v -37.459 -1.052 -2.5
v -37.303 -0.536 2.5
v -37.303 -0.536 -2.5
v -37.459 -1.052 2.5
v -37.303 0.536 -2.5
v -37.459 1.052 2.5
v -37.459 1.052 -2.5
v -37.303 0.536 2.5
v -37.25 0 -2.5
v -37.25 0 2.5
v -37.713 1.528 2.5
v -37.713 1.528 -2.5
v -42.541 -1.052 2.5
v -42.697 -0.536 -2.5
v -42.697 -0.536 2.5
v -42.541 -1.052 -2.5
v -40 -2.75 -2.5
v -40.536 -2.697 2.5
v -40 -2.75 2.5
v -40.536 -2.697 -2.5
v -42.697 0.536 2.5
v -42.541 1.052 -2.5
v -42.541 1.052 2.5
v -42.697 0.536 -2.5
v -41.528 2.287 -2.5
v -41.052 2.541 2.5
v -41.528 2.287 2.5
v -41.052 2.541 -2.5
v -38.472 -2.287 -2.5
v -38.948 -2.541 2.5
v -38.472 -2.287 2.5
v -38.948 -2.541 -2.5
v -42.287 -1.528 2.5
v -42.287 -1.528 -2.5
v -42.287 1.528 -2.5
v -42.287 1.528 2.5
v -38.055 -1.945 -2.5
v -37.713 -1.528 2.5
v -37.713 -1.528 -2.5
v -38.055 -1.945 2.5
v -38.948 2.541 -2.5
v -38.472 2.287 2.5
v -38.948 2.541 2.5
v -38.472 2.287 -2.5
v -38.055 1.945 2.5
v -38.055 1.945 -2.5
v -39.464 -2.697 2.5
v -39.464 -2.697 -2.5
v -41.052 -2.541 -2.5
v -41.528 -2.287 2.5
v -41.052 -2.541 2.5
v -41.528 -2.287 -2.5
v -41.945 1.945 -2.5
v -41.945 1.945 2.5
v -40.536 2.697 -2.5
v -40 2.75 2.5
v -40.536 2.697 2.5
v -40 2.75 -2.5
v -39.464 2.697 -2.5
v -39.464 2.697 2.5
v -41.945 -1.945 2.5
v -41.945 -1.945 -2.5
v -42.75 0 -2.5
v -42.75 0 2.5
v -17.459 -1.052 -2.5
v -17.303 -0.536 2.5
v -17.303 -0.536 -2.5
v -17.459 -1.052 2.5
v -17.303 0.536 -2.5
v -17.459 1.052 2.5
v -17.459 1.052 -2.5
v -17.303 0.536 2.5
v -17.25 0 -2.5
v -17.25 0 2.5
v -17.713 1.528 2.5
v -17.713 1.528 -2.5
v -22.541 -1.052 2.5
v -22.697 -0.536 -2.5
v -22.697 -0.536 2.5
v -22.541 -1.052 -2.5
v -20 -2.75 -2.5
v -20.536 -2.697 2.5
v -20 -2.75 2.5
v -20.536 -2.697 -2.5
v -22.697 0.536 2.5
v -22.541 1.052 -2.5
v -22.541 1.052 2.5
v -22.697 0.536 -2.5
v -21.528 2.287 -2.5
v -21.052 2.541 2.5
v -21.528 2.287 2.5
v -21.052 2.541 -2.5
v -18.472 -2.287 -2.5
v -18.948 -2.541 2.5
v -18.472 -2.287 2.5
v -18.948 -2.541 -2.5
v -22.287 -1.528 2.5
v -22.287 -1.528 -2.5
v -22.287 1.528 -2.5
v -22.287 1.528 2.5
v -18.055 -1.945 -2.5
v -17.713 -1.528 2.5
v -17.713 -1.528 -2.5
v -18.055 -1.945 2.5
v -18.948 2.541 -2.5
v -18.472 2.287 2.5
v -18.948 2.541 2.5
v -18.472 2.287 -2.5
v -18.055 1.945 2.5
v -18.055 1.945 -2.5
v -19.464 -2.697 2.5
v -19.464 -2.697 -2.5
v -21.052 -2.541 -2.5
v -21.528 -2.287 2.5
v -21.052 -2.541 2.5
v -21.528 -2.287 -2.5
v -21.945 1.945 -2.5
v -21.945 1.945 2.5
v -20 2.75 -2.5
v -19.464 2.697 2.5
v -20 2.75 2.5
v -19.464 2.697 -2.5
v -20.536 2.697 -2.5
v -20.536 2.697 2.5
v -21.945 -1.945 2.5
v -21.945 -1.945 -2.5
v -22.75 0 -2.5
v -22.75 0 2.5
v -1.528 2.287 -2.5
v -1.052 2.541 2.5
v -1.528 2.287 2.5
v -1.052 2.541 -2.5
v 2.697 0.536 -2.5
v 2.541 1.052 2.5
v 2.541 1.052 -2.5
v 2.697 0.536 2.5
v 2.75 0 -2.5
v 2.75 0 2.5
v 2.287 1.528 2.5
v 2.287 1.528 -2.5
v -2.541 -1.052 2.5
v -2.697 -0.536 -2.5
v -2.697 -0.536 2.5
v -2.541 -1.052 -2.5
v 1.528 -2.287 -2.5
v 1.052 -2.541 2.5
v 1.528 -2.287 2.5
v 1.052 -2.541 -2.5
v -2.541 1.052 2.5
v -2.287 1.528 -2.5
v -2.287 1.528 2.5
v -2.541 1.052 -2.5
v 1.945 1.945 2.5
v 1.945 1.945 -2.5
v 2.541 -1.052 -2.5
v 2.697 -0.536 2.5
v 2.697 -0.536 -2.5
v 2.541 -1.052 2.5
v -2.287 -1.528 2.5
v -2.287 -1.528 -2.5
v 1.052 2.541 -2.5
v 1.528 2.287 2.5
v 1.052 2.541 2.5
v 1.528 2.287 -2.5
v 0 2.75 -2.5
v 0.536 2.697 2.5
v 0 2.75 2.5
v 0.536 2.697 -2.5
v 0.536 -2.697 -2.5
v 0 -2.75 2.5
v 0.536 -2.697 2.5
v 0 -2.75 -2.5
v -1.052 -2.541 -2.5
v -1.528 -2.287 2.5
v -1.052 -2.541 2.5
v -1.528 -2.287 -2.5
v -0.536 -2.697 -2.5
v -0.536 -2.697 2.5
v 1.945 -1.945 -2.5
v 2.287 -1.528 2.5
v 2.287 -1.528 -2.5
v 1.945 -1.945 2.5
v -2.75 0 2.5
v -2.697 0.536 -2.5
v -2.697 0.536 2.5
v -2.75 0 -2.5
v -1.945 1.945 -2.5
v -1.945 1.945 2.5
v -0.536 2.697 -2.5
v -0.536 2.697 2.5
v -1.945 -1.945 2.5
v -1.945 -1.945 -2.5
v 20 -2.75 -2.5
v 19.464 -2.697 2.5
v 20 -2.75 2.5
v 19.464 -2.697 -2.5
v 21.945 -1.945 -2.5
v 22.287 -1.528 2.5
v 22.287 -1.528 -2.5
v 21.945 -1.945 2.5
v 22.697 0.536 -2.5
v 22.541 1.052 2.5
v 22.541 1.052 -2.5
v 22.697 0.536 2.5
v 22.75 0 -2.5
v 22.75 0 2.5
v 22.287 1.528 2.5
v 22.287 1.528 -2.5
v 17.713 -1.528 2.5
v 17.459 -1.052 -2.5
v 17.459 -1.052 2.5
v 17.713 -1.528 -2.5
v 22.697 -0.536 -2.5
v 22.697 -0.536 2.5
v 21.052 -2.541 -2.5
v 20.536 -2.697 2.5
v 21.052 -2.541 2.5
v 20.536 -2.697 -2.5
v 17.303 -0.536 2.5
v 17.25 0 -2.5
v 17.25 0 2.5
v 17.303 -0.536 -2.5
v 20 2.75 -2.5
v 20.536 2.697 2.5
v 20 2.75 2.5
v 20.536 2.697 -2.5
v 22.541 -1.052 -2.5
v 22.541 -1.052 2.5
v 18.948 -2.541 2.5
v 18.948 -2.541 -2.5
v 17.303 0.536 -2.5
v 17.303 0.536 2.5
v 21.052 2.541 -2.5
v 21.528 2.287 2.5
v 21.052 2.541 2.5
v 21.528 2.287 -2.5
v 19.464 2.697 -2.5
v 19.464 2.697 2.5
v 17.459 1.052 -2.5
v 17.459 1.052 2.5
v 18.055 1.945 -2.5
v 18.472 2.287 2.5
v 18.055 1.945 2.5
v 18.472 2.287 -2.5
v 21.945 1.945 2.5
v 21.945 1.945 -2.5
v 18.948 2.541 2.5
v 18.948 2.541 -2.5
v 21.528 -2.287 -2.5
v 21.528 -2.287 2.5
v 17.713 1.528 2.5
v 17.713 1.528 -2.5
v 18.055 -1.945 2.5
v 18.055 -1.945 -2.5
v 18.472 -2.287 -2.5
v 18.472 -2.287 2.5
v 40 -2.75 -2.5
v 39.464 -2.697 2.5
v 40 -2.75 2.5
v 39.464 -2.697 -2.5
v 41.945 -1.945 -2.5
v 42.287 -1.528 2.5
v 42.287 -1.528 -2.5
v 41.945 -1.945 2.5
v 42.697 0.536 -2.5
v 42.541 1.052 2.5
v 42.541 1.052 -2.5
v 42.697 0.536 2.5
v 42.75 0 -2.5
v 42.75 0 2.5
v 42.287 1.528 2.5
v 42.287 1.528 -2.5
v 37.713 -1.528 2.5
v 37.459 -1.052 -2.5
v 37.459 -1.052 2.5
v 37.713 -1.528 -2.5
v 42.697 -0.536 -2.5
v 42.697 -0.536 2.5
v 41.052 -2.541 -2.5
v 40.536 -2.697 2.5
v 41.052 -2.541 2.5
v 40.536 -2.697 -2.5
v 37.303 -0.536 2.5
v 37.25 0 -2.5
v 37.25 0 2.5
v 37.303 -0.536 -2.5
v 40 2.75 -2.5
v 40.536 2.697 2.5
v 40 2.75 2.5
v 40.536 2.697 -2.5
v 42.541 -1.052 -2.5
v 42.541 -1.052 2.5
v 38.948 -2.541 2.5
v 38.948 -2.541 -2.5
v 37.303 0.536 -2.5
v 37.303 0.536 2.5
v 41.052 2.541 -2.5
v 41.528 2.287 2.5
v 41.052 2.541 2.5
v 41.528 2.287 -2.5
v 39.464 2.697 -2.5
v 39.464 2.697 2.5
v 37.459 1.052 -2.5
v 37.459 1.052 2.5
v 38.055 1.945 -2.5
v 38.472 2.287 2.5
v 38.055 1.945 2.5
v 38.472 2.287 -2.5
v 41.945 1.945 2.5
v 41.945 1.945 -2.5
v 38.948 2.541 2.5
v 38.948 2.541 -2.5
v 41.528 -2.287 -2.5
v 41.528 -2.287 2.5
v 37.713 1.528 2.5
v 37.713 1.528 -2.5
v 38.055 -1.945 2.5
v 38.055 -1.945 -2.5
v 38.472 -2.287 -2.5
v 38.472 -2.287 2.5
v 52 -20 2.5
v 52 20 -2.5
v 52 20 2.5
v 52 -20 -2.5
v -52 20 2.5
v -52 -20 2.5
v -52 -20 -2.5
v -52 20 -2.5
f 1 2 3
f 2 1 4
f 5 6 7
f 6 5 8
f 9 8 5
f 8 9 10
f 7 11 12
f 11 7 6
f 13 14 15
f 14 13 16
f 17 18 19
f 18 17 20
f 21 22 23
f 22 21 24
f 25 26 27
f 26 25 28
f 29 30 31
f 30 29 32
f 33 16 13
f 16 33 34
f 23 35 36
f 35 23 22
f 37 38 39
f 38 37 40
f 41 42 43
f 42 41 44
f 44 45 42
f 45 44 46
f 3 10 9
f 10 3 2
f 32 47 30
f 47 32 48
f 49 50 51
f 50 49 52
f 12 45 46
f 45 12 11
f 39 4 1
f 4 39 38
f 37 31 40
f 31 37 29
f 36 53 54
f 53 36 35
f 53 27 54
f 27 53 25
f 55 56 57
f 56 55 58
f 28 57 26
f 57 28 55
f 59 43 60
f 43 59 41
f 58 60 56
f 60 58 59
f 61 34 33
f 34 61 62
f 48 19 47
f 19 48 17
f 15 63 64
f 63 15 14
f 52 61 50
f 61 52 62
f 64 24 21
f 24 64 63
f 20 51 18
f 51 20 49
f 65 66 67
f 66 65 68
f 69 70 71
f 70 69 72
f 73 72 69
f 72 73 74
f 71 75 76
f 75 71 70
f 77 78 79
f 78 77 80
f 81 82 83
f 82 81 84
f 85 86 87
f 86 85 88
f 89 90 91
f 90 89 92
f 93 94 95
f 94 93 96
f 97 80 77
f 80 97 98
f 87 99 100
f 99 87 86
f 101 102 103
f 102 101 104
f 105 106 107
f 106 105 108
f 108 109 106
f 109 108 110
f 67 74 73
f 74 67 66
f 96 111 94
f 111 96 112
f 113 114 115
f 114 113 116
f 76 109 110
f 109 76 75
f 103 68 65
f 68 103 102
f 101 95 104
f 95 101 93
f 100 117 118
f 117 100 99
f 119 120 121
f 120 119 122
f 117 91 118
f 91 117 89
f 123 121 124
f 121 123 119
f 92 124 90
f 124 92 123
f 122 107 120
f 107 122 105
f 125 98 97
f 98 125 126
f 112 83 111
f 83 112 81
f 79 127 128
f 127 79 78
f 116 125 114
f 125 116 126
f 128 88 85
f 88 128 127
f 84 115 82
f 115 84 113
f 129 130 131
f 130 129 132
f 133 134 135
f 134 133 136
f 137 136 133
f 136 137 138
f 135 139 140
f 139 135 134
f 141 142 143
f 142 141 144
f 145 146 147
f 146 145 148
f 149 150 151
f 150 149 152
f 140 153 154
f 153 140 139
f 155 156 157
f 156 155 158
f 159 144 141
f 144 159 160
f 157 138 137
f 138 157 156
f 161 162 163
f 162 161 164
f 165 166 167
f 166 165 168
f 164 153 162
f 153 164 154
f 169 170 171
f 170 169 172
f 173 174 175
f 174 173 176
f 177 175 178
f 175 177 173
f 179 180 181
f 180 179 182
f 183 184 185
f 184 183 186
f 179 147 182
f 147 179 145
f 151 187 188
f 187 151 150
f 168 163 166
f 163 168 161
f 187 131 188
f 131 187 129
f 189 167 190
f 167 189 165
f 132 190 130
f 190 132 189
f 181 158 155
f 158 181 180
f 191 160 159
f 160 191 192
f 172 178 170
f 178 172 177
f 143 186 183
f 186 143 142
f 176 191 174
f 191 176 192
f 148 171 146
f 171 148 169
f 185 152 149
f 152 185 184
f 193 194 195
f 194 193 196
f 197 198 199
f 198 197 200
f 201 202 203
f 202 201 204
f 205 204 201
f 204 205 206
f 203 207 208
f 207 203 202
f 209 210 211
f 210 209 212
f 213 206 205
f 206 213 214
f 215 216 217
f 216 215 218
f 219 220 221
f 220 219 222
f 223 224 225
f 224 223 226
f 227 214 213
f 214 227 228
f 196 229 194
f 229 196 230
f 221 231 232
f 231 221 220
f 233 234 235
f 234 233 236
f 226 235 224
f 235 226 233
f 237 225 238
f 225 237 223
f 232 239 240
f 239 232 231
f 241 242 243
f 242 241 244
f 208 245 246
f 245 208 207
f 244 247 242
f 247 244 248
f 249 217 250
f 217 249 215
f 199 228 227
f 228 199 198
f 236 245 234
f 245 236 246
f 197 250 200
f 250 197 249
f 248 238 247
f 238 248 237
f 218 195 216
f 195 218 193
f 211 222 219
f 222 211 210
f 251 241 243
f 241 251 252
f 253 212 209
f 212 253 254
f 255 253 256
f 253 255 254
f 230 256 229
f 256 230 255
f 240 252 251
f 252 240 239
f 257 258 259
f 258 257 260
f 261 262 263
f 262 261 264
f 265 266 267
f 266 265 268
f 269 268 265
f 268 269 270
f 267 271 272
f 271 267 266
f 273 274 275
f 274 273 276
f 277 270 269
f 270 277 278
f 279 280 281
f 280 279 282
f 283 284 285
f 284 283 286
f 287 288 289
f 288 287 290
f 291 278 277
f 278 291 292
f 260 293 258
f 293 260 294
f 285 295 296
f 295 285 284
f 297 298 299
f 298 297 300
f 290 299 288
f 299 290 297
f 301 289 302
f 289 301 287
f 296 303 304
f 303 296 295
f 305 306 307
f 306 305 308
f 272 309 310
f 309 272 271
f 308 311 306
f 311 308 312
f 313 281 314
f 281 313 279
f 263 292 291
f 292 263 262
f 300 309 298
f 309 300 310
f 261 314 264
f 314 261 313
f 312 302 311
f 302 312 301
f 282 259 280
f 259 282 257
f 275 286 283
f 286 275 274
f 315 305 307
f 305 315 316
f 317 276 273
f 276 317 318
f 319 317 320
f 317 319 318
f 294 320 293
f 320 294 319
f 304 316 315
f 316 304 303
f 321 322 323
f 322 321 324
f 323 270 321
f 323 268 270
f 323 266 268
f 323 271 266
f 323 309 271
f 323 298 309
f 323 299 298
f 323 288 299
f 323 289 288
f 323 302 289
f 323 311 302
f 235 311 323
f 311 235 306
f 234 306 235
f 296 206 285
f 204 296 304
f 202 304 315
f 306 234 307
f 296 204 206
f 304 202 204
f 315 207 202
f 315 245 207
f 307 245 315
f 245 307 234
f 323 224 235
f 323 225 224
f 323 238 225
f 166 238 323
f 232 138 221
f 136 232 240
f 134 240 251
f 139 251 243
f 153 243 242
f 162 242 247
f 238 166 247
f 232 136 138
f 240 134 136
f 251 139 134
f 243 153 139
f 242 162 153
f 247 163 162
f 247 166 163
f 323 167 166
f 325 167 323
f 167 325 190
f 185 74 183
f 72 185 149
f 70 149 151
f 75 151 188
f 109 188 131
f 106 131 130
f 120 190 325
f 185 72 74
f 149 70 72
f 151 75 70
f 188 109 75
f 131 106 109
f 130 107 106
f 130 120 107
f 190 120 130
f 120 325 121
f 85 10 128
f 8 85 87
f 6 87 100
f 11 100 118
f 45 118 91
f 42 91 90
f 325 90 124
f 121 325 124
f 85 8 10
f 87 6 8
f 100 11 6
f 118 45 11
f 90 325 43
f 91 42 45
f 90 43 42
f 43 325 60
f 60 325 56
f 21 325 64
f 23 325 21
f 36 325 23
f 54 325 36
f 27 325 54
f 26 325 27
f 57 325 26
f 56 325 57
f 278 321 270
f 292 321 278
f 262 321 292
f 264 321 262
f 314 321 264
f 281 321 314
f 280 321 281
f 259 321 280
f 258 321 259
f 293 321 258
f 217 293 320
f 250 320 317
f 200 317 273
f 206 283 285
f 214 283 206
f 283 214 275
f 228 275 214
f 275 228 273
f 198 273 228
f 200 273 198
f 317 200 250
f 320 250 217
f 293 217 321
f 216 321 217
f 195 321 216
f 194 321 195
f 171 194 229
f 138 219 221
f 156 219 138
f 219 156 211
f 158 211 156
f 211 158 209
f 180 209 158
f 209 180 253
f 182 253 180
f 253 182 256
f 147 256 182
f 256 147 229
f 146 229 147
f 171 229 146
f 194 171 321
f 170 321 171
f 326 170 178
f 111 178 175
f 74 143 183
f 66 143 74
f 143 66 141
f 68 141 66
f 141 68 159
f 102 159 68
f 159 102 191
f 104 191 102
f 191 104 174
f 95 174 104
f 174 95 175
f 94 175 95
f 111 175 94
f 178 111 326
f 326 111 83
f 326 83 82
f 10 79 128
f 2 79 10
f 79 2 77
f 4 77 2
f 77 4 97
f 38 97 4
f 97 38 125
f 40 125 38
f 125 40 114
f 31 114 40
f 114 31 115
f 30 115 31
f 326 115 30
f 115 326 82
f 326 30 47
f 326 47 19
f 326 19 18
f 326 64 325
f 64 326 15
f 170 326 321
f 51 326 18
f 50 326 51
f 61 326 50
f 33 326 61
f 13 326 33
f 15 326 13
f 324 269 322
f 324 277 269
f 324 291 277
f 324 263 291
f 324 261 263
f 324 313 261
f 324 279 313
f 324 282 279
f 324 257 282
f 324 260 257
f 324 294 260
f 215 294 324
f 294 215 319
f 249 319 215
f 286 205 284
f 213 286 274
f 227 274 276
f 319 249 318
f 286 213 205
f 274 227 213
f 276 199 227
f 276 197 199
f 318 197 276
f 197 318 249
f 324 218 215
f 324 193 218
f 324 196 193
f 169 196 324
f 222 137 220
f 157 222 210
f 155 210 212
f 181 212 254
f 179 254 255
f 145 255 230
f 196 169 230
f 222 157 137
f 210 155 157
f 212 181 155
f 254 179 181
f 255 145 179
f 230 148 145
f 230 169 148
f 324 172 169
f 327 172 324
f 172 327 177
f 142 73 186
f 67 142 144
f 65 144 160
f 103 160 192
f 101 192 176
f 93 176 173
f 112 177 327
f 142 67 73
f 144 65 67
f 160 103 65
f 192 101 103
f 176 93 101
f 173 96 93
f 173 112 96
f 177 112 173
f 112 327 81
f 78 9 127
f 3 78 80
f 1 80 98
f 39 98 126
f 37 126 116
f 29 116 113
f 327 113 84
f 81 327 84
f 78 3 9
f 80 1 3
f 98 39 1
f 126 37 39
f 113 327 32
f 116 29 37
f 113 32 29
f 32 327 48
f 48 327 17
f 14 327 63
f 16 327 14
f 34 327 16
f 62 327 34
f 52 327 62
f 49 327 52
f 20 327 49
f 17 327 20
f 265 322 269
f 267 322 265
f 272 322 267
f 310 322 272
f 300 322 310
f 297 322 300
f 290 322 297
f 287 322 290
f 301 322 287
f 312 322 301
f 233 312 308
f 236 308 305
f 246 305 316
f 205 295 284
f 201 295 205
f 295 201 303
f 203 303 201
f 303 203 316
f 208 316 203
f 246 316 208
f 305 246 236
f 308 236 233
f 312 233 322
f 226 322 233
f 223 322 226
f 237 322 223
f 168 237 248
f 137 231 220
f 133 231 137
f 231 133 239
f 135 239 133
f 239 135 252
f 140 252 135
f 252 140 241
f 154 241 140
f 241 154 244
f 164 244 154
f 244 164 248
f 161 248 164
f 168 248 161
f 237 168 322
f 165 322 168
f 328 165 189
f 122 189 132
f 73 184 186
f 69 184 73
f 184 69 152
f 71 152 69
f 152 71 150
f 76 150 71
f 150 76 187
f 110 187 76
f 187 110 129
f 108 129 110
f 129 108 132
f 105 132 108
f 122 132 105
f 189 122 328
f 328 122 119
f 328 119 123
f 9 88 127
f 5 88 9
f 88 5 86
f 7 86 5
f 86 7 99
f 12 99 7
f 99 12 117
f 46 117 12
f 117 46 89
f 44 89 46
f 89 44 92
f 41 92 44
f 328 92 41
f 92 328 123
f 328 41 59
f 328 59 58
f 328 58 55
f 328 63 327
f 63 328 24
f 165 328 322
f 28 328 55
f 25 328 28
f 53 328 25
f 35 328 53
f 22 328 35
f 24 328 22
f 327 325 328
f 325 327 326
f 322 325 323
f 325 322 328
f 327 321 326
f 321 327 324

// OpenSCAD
$fn = 32;

// ----------------------------------------------------------------------
// Hole bar, 5 x Ø5.5
// skip layout, 12 mm edge offset
// ----------------------------------------------------------------------

// --- parameters (mm) ---
bar_w = 40;       // bar width (Y)
bar_t = 5;        // bar thickness (Z)
holes = 5;        // holes per row
hole_d = 5.5;     // hole diameter
edge = 12;        // offset from the bar end to the first hole
grid_pitch = 10;  // grid the bar was laid out on

// --- derived feature positions (mm) ---
pitch = grid_pitch * 2;       // = 20   holes sit every other grid slot
span = (holes - 1) * pitch;   // = 80   distance between the end holes
bar_l = span + 2 * edge;      // = 104   overall bar length
start_x = -bar_l / 2 + edge;  // = -40   X of the first hole
feature_centers = [
  [start_x + 0 * pitch, 0],
  [start_x + 1 * pitch, 0],
  [start_x + 2 * pitch, 0],
  [start_x + 3 * pitch, 0],
  [start_x + 4 * pitch, 0]
];   // hole centres of the first row

// bar with one row of holes, drilled from feature_centers
difference() {
  translate([-bar_l / 2, -bar_w / 2, -bar_t / 2]) cube([bar_l, bar_w, bar_t]);
  for (centre = feature_centers)
    translate([centre[0], centre[1], 0])
      cylinder(d = hole_d, h = bar_t + 2, center = true);
}
